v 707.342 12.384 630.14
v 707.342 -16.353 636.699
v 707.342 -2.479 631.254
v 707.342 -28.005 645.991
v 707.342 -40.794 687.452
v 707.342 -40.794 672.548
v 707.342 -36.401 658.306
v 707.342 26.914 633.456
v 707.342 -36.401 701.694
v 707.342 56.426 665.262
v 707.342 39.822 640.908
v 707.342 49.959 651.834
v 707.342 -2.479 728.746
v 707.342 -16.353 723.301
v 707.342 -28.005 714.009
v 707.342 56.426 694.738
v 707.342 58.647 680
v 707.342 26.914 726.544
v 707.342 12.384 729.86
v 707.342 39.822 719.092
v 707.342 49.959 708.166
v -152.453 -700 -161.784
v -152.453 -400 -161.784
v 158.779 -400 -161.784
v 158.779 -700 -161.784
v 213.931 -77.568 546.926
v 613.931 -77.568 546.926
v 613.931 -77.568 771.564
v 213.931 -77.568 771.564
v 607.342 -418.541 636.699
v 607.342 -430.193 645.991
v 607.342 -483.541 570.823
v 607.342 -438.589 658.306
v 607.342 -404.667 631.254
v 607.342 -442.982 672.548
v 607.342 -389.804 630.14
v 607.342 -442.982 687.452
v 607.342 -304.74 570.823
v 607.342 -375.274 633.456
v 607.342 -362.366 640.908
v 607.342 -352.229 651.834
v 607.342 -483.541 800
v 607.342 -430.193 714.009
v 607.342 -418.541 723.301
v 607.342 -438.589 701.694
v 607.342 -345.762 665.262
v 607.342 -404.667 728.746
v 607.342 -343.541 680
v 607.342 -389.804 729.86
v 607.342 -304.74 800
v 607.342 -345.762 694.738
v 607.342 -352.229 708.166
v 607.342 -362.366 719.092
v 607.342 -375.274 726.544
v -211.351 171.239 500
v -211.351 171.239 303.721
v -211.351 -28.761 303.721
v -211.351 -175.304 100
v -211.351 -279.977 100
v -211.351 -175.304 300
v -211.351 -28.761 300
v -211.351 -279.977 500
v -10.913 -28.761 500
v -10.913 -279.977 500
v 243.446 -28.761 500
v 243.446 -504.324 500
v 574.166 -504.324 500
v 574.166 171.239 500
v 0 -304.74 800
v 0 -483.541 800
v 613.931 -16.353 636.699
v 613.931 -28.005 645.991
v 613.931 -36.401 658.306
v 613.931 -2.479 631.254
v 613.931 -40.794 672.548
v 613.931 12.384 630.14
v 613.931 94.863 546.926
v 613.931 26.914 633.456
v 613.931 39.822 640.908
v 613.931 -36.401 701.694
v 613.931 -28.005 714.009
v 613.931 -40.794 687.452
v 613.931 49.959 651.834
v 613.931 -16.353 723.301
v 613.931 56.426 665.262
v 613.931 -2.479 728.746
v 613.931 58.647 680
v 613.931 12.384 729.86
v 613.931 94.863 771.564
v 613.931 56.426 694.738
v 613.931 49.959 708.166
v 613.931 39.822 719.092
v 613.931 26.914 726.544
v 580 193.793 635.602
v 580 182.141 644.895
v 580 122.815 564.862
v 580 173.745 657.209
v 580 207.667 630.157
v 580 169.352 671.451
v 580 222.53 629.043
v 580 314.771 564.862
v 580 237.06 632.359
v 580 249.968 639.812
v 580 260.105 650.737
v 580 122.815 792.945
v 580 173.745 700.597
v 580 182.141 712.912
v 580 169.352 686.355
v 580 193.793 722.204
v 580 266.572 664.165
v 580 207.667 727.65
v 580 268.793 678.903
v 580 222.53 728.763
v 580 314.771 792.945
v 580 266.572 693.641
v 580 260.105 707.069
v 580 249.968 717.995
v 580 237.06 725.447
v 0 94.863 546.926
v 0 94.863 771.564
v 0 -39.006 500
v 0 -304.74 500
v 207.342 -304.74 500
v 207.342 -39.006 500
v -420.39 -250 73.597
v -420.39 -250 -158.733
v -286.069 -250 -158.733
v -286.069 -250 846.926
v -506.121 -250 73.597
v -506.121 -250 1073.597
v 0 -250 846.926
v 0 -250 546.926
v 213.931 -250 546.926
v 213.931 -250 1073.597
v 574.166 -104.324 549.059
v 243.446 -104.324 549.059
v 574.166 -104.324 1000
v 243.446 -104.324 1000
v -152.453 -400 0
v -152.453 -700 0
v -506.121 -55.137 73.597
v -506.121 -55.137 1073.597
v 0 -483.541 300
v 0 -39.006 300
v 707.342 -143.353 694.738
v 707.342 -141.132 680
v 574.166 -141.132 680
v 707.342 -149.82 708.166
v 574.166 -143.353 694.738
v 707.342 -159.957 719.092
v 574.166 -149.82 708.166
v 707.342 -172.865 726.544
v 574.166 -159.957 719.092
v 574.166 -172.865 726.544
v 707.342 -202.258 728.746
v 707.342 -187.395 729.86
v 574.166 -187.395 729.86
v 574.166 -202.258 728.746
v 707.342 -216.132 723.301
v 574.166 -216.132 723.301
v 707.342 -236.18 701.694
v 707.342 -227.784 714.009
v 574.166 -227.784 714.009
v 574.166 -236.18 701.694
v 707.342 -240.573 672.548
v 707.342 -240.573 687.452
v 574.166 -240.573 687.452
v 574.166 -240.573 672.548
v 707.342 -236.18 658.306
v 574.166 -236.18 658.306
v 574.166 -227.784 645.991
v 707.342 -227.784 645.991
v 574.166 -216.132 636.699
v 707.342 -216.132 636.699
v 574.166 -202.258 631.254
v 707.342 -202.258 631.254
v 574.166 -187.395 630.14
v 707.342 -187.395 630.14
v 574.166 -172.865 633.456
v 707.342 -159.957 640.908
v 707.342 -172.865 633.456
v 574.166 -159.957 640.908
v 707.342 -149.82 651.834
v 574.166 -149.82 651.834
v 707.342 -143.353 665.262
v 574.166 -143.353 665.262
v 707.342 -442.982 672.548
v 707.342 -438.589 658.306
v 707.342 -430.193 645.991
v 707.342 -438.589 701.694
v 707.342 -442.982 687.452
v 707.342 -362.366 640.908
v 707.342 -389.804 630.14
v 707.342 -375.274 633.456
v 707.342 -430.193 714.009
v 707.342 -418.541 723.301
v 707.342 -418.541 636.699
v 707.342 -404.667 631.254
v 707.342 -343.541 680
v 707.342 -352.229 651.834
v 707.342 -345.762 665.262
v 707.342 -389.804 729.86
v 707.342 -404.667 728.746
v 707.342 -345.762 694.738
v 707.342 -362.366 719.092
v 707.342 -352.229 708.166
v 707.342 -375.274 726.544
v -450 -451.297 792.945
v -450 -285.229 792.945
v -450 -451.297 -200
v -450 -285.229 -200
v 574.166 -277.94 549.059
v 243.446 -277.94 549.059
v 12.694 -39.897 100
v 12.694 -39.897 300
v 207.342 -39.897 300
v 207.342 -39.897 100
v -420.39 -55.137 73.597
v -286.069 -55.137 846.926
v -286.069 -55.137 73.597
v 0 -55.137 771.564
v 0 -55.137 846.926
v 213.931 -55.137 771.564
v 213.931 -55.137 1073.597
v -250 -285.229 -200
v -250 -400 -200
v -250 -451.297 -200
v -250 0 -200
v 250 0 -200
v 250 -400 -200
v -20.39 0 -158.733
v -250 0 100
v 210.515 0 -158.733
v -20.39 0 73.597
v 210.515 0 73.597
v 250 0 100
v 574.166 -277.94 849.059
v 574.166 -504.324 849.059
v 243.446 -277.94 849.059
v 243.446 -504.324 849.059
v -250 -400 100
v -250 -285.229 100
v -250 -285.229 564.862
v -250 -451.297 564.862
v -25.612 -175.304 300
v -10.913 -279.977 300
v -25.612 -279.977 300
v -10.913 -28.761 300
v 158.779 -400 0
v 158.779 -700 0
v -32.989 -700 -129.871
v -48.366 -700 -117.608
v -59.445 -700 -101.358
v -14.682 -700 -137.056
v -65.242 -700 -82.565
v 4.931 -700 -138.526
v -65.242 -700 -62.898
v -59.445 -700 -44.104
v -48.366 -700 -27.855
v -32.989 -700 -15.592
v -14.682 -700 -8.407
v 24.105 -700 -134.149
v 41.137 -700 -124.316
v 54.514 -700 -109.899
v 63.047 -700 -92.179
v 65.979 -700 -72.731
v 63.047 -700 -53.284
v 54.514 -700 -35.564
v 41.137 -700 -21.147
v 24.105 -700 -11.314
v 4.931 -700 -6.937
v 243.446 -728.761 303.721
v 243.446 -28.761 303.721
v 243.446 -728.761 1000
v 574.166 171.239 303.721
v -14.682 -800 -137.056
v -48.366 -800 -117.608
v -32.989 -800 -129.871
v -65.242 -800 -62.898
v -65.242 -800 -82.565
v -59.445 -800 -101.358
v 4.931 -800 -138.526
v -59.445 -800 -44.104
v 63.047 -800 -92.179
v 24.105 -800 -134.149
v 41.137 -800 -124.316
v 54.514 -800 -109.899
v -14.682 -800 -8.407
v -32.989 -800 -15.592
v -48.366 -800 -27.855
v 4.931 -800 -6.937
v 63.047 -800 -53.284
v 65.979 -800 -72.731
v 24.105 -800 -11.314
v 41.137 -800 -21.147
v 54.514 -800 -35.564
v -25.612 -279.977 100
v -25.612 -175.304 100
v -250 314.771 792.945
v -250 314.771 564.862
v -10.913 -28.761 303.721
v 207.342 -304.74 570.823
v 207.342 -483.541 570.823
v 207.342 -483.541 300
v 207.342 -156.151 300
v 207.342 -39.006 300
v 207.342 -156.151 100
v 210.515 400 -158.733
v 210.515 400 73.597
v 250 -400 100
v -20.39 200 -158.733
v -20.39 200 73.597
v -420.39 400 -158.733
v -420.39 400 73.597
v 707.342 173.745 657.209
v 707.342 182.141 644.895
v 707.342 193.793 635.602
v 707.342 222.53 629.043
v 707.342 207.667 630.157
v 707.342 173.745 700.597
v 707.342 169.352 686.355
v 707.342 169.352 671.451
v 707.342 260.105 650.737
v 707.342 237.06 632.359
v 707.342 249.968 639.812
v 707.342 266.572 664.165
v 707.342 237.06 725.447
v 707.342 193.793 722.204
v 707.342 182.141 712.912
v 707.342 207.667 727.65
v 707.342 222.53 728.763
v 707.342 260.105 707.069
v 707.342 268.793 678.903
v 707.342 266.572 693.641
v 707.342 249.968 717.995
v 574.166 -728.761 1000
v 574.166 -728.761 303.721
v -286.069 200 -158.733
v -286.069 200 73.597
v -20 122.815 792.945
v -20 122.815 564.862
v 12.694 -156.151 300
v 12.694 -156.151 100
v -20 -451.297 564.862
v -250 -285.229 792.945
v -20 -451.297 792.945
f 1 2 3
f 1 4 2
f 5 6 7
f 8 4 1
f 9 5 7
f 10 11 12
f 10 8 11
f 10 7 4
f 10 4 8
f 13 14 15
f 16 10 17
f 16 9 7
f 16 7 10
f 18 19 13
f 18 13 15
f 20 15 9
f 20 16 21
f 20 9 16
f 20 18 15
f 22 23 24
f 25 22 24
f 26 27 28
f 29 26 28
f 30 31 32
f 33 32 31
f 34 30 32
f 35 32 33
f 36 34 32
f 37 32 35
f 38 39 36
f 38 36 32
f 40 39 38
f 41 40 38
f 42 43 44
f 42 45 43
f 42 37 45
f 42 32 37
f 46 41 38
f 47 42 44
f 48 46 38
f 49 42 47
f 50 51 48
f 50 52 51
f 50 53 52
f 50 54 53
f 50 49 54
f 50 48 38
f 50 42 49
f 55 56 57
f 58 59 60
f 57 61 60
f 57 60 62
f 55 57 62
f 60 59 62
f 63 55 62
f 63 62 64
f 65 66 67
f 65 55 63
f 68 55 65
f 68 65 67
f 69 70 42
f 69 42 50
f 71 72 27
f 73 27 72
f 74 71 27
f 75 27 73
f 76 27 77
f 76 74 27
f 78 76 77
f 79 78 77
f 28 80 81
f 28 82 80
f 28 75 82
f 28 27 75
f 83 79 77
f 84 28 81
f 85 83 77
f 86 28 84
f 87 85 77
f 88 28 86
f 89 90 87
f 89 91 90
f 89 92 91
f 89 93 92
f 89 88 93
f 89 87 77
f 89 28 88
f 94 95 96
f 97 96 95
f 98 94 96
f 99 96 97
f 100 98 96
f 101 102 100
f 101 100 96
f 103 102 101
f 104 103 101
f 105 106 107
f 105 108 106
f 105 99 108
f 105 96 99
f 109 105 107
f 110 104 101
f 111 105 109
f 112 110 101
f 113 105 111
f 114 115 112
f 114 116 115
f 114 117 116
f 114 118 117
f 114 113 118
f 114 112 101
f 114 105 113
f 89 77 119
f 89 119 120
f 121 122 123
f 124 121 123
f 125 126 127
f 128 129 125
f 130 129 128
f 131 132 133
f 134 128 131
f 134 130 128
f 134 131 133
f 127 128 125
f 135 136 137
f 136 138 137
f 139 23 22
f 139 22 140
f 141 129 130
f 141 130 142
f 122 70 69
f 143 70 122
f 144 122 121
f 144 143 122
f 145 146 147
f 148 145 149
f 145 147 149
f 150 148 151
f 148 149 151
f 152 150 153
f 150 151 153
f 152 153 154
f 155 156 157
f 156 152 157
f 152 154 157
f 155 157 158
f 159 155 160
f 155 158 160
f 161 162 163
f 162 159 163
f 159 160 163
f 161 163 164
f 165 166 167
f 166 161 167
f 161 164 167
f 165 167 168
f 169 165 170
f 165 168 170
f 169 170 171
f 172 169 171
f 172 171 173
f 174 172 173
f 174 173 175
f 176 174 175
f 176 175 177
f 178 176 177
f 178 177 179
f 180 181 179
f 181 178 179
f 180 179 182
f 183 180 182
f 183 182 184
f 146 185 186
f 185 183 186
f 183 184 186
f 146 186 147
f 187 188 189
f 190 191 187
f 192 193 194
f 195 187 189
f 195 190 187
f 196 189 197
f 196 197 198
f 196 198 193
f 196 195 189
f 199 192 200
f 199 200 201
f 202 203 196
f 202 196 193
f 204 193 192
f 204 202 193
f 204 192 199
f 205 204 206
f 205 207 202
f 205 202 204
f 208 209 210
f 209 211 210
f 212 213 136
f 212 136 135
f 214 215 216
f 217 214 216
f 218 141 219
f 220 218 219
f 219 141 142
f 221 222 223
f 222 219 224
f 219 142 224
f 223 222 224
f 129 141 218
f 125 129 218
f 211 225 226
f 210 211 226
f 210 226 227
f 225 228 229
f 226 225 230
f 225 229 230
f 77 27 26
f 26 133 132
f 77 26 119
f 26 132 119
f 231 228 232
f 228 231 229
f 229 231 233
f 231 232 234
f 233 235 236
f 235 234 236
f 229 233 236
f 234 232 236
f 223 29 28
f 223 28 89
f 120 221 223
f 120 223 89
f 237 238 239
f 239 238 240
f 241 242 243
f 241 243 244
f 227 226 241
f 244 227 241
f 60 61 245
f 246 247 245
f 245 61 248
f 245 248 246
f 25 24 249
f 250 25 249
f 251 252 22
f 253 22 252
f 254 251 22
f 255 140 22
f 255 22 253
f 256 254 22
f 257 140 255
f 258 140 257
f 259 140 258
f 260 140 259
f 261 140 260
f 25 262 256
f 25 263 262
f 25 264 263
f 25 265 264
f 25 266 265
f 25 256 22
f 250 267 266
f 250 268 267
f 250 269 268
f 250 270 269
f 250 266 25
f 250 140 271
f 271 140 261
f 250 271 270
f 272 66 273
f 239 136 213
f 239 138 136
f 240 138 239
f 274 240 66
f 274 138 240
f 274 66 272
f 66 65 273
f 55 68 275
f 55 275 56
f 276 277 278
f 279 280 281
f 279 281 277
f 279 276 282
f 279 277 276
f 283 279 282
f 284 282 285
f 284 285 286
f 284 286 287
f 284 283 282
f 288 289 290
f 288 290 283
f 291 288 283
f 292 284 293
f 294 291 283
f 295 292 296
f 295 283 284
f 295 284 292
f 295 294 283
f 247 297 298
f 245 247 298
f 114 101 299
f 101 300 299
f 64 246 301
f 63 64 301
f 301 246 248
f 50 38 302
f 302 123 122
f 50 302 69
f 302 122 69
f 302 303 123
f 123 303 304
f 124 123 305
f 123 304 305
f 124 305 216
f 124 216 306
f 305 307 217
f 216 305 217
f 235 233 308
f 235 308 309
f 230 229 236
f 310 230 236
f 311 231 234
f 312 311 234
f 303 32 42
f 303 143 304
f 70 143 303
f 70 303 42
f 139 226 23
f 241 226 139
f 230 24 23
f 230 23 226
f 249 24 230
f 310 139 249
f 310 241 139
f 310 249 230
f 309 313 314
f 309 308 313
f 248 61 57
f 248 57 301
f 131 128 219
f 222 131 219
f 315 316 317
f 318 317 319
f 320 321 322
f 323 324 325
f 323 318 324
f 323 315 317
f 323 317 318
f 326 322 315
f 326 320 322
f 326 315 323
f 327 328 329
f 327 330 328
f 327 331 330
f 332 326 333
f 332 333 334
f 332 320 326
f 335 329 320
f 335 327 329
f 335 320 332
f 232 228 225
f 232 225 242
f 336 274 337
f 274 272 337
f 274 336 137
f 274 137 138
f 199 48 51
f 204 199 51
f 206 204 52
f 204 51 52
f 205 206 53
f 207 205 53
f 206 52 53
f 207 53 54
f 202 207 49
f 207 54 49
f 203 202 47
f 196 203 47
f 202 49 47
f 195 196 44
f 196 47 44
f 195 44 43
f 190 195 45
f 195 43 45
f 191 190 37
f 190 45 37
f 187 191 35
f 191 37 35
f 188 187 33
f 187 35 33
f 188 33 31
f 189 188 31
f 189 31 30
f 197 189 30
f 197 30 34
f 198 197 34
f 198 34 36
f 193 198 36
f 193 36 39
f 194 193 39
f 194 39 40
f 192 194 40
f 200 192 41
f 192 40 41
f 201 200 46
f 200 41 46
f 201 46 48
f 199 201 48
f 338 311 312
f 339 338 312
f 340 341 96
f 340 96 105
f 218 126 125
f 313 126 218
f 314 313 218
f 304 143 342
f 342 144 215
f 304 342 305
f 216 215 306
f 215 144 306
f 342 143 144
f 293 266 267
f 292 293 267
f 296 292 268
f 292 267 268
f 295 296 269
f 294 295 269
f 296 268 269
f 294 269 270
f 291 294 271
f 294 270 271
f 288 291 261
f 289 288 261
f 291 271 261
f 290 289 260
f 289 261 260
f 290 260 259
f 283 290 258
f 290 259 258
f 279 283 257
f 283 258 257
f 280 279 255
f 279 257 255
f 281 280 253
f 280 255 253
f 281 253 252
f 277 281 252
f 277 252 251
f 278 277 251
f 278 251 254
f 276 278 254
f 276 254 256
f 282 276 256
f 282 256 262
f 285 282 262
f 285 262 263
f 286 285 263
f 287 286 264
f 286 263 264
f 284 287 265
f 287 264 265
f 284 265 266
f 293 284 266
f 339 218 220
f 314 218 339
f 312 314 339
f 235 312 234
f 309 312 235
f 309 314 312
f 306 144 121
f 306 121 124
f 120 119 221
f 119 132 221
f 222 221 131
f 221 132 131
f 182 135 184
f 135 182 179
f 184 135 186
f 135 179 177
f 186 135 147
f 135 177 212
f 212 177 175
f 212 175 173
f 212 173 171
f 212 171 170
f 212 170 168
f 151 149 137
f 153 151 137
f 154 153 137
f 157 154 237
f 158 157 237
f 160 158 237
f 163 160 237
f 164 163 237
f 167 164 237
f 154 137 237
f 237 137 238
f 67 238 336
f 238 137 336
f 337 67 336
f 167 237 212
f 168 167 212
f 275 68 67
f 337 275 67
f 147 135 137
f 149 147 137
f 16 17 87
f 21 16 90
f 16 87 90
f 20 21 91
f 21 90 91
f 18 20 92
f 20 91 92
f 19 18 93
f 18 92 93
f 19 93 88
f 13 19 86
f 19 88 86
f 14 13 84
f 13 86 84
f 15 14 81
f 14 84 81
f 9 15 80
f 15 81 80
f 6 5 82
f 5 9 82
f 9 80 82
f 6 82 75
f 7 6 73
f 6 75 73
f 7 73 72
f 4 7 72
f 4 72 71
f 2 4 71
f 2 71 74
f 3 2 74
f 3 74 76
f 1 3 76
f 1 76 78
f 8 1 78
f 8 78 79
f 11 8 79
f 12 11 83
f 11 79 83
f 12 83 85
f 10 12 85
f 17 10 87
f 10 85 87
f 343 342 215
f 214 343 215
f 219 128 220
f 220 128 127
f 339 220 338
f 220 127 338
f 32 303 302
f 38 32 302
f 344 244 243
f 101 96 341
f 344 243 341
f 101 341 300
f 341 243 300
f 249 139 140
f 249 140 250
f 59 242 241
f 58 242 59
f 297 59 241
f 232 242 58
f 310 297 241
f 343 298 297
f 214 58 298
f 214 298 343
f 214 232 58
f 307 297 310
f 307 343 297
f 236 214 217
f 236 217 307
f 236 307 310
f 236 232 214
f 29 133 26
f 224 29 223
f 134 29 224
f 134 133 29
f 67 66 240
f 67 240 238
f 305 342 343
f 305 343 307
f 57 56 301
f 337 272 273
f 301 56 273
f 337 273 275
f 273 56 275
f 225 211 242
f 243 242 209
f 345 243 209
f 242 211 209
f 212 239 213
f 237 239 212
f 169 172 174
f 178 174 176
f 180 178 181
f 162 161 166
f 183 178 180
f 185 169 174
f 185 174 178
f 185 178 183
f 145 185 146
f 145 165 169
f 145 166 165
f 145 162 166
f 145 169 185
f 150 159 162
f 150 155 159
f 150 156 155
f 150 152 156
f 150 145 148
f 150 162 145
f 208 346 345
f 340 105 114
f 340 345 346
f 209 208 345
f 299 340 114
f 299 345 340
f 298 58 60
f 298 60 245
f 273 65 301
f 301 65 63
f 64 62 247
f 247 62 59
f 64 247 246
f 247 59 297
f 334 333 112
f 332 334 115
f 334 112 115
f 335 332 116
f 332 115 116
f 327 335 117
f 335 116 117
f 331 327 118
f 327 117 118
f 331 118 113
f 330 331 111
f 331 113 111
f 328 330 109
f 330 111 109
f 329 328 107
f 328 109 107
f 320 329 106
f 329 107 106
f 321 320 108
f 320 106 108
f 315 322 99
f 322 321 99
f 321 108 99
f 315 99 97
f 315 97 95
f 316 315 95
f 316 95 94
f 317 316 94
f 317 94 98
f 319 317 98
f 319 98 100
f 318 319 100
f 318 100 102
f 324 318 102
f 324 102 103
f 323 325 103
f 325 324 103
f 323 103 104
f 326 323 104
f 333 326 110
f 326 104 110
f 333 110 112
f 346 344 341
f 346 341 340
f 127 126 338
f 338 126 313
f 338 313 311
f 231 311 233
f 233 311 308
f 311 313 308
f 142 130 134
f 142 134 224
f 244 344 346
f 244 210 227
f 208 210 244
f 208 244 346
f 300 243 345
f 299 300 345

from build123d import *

# Parameters (mm, degrees)
F0_W      = 500
F0_H      = 300
F1_DEPTH  = 400
F2_W      = 194.6479137987
F2_H      = 116.2542514503
F2_W_2    = 185.7395432889
F2_H_2    = 104.6733558178
F3_DEPTH  = 200
F4_W      = 200.438356027
F4_H      = 251.2160688639
F4_W_2    = 207.3423415422
F4_H_2    = 244.5347867906
F5_DEPTH  = 200
F6_W      = 311.2314343452
F6_H      = 161.7837399244
F7_DEPTH  = 300
F8_W      = 785.5169922113
F8_H      = 196.2788403034
F9_DEPTH  = 200
F10_DEPTH = 200
F11_W     = 207.3423415422
F11_H     = 178.8012206554
F12_DEPTH = 300
F13_W     = 330.7198137045
F13_H     = 196.2788403034
F14_DEPTH = 700
F15_W     = 178.8012206554
F15_H     = 229.1771650314
F16_DEPTH = 400
F17_W     = 166.0685539246
F17_H     = 392.9448246956
F18_DEPTH = 200
F19_DEPTH = 600
F20_W     = 166.0685539246
F20_H     = 228.0832886696
F21_DEPTH = 230
F22_W     = 230
F22_H     = 228.0832886696
F23_DEPTH = 600
F24_W     = 191.9558256865
F24_H     = 228.0832886696
F25_DEPTH = 600
F26_W     = 330.7198137045
F26_H     = 224.4375318289
F27_DEPTH = 500
F28_W     = 330.7198137045
F28_H     = 150.941491127
F29_DEPTH = 400
F30_W     = 330.7198137045
F30_H     = 173.616194725
F31_DEPTH = 300
F32_W     = 230.9049870819
F32_H     = 232.3303222656
F33_DEPTH = 400
F34_W     = 200
F34_H     = 232.3303222656
F35_DEPTH = 400
F36_W     = 134.3211080879
F36_H     = 232.3303222656
F37_DEPTH = 450
F38_W     = 220.0524806976
F38_H     = 194.8631778359
F39_DEPTH = 1000
F40_W     = 194.8631778359
F40_H     = 226.6708314419
F41_DEPTH = 500
F42_W     = 213.9312028885
F42_H     = 194.8631778359
F43_DEPTH = 300
F44_W     = 213.9312028885
F44_H     = 224.6371984482
F45_DEPTH = 150
F46_W     = 172.431588918
F46_H     = 224.6371984482
F47_DEPTH = 400
F48_R     = 65.9786612065
F49_DEPTH = 100
F50_R     = 50
F51_DEPTH = 100
F52_R     = 50
F53_DEPTH = 200
F54_R     = 50
F55_DEPTH = 200
F56_R     = 50
F57_DEPTH = 200
F58_W     = 1393.2492136955
F58_H     = 511.3118588924
F58_R     = 50
F59_DEPTH = 200


with BuildPart() as f1:
    # F0 (on Front) → F1 (new body)
    with BuildSketch(Plane.XZ):
        with Locations((0, -50)):
            Rectangle(F0_W, F0_H)
    extrude(amount=F1_DEPTH)

    # F2 (on face) → F3 (join)
    with BuildSketch(Plane.XY.offset(100)):
        with Locations((110.0183846429, -98.0239007622)):
            Rectangle(F2_W, F2_H)
        with Locations((-118.4813398868, -227.6407033205)):
            Rectangle(F2_W_2, F2_H_2)
    extrude(amount=F3_DEPTH)

    # F4 (on face) → F5 (join)
    with BuildSketch(Plane.XY.offset(300)):
        with Locations((-111.1319335178, -154.3693467975)):
            Rectangle(F4_W, F4_H)
        with Locations((103.6711707711, -161.2733323127)):
            Rectangle(F4_W_2, F4_H_2)
    extrude(amount=F5_DEPTH)

    # F6 (on face) → F7 (join)
    with BuildSketch(Plane.XZ.offset(400)):
        with Locations((3.1632035971, -80.8918699622)):
            Rectangle(F6_W, F6_H)
    extrude(amount=F7_DEPTH)

    # F8 (on face) → F9 (join)
    with BuildSketch(Plane(origin=(0, -28.7613123655, 0), x_dir=(-1, 0, 0), z_dir=(0, 1, 0))):
        with Locations((-181.4073845744, 401.8605798483)):
            Rectangle(F8_W, F8_H)
    extrude(amount=F9_DEPTH)

    # F10 (add): a face of the model
    f10_faces = [f1.faces().sort_by_distance(p)[0] for p in [
        (103.6711707711, -283.540725708, 400),
    ]]
    extrude(f10_faces, amount=F10_DEPTH)

    # F11 (on face) → F12 (join)
    with BuildSketch(Plane.XY.offset(500)):
        with Locations((103.6711707711, -394.1401153803)):
            Rectangle(F11_W, F11_H)
    extrude(amount=F12_DEPTH)

    # F13 (on face) → F14 (join)
    with BuildSketch(Plane.XZ.offset(28.7613123655)):
        with Locations((408.8059738278, 401.8605798483)):
            Rectangle(F13_W, F13_H)
    extrude(amount=F14_DEPTH)

    # F15 (on face) → F16 (join)
    with BuildSketch(Plane.YZ.offset(207.3423415422)):
        with Locations((-394.1401153803, 685.4114174843)):
            Rectangle(F15_W, F15_H)
    extrude(amount=F16_DEPTH)

    # F17 (on face) → F18 (join)
    with BuildSketch(Plane(origin=(-250, 0, 0), x_dir=(0, -1, 0), z_dir=(-1, 0, 0))):
        with Locations((368.2630956173, -3.5275876522)):
            Rectangle(F17_W, F17_H)
    extrude(amount=F18_DEPTH)

    # F19 (add): a face of the model
    f19_faces = [f1.faces().sort_by_distance(p)[0] for p in [
        (-350, -368.2630956173, 192.9448246956),
    ]]
    extrude(f19_faces, amount=F19_DEPTH)

    # F20 (on face) → F21 (join)
    with BuildSketch(Plane.YZ.offset(-250)):
        with Locations((-368.2630956173, 678.9031803608)):
            Rectangle(F20_W, F20_H)
    extrude(amount=F21_DEPTH)

    # F22 (on face) → F23 (join)
    with BuildSketch(Plane(origin=(0, -285.228818655, 0), x_dir=(-1, 0, 0), z_dir=(0, 1, 0))):
        with Locations((135, 678.9031803608)):
            Rectangle(F22_W, F22_H)
    extrude(amount=F23_DEPTH)

    # F24 (on face) → F25 (join)
    with BuildSketch(Plane.YZ.offset(-20)):
        with Locations((218.7932685018, 678.9031803608)):
            Rectangle(F24_W, F24_H)
    extrude(amount=F25_DEPTH)

    # F26 (on face) → F27 (join)
    with BuildSketch(Plane.XY.offset(500)):
        with Locations((408.8059738278, -616.5425464511)):
            Rectangle(F26_W, F26_H)
    extrude(amount=F27_DEPTH)

    # F28 (on face) → F29 (join)
    with BuildSketch(Plane(origin=(0, -504.3237805367, 0), x_dir=(-1, 0, 0), z_dir=(0, 1, 0))):
        with Locations((-408.8059738278, 924.5292544365)):
            Rectangle(F28_W, F28_H)
    extrude(amount=F29_DEPTH)

    # F30 (on face) → F31 (join)
    with BuildSketch(Plane(origin=(0, 0, 849.058508873), x_dir=(1, 0, 0), z_dir=(0, 0, -1))):
        with Locations((408.8059738278, 191.1318778992)):
            Rectangle(F30_W, F30_H)
    extrude(amount=F31_DEPTH)

    # F32 (on face) → F33 (join)
    with BuildSketch(Plane(origin=(0, 0, 0), x_dir=(-1, 0, 0), z_dir=(0, 1, 0))):
        with Locations((-95.0625883415, -42.5678789616)):
            Rectangle(F32_W, F32_H)
    extrude(amount=F33_DEPTH)

    # F34 (on face) → F35 (join)
    with BuildSketch(Plane(origin=(-20.3899051994, 0, 0), x_dir=(0, -1, 0), z_dir=(-1, 0, 0))):
        with Locations((-300, -42.5678789616)):
            Rectangle(F34_W, F34_H)
    extrude(amount=F35_DEPTH)

    # F36 (on face) → F37 (join)
    with BuildSketch(Plane.XZ.offset(-200)):
        with Locations((-353.2293511555, -42.5678789616)):
            Rectangle(F36_W, F36_H)
    extrude(amount=F37_DEPTH)

    # F38 (on face) → F39 (join)
    with BuildSketch(Plane.XY.offset(73.5972821712)):
        with Locations((-396.0950374603, -152.568411082)):
            Rectangle(F38_W, F38_H)
    extrude(amount=F39_DEPTH)

    # F40 (on face) → F41 (join)
    with BuildSketch(Plane.YZ.offset(-286.0687971115)):
        with Locations((-152.568411082, 960.2618664503)):
            Rectangle(F40_W, F40_H)
    extrude(amount=F41_DEPTH)

    # F42 (on face) → F43 (join)
    with BuildSketch(Plane(origin=(0, 0, 846.9264507294), x_dir=(1, 0, 0), z_dir=(0, 0, -1))):
        with Locations((106.9656014442, 152.568411082)):
            Rectangle(F42_W, F42_H)
    extrude(amount=F43_DEPTH)

    # F44 (on face) → F45 (join)
    with BuildSketch(Plane(origin=(0, -55.1368221641, 0), x_dir=(-1, 0, 0), z_dir=(0, 1, 0))):
        with Locations((-106.9656014442, 659.2450499535)):
            Rectangle(F44_W, F44_H)
    extrude(amount=F45_DEPTH)

    # F46 (on face) → F47 (join)
    with BuildSketch(Plane.YZ.offset(213.9312028885)):
        with Locations((8.647383377, 659.2450499535)):
            Rectangle(F46_W, F46_H)
    extrude(amount=F47_DEPTH)

    # F48 (on face) → F49 (join)
    with BuildSketch(Plane.XZ.offset(700)):
        with Locations((0, -72.7314278483)):
            Circle(F48_R)
    extrude(amount=F49_DEPTH)

    # F50 (on face) → F51 (join)
    with BuildSketch(Plane.YZ.offset(607.3423415422)):
        with Locations((-393.540725708, 680)):
            Circle(F50_R)
    extrude(amount=F51_DEPTH)

    # F52 (on face) → F53 (join)
    with BuildSketch(Plane.YZ.offset(574.1658806801)):
        with Locations((-191.1318778992, 680)):
            Circle(F52_R)
    extrude(amount=F53_DEPTH)

    # F54 (on face) → F55 (join)
    with BuildSketch(Plane.YZ.offset(613.9312028885)):
        with Locations((8.647383377, 680)):
            Circle(F54_R)
    extrude(amount=F55_DEPTH)

    # F56 (on face) → F57 (join)
    with BuildSketch(Plane.YZ.offset(580)):
        with Locations((218.7932685018, 678.9031803608)):
            Circle(F56_R)
    extrude(amount=F57_DEPTH)

    # F58 (on face) → F59 (cut)
    with BuildSketch(Plane.YZ.offset(707.3423415422)):
        with Locations((-61.5827143192, 670.519605279)):
            Rectangle(F58_W, F58_H)
        with Locations((-393.540725708, 680)):
            Circle(F58_R, mode=Mode.SUBTRACT)
    extrude(amount=F59_DEPTH, mode=Mode.SUBTRACT)


solid = f1.part
